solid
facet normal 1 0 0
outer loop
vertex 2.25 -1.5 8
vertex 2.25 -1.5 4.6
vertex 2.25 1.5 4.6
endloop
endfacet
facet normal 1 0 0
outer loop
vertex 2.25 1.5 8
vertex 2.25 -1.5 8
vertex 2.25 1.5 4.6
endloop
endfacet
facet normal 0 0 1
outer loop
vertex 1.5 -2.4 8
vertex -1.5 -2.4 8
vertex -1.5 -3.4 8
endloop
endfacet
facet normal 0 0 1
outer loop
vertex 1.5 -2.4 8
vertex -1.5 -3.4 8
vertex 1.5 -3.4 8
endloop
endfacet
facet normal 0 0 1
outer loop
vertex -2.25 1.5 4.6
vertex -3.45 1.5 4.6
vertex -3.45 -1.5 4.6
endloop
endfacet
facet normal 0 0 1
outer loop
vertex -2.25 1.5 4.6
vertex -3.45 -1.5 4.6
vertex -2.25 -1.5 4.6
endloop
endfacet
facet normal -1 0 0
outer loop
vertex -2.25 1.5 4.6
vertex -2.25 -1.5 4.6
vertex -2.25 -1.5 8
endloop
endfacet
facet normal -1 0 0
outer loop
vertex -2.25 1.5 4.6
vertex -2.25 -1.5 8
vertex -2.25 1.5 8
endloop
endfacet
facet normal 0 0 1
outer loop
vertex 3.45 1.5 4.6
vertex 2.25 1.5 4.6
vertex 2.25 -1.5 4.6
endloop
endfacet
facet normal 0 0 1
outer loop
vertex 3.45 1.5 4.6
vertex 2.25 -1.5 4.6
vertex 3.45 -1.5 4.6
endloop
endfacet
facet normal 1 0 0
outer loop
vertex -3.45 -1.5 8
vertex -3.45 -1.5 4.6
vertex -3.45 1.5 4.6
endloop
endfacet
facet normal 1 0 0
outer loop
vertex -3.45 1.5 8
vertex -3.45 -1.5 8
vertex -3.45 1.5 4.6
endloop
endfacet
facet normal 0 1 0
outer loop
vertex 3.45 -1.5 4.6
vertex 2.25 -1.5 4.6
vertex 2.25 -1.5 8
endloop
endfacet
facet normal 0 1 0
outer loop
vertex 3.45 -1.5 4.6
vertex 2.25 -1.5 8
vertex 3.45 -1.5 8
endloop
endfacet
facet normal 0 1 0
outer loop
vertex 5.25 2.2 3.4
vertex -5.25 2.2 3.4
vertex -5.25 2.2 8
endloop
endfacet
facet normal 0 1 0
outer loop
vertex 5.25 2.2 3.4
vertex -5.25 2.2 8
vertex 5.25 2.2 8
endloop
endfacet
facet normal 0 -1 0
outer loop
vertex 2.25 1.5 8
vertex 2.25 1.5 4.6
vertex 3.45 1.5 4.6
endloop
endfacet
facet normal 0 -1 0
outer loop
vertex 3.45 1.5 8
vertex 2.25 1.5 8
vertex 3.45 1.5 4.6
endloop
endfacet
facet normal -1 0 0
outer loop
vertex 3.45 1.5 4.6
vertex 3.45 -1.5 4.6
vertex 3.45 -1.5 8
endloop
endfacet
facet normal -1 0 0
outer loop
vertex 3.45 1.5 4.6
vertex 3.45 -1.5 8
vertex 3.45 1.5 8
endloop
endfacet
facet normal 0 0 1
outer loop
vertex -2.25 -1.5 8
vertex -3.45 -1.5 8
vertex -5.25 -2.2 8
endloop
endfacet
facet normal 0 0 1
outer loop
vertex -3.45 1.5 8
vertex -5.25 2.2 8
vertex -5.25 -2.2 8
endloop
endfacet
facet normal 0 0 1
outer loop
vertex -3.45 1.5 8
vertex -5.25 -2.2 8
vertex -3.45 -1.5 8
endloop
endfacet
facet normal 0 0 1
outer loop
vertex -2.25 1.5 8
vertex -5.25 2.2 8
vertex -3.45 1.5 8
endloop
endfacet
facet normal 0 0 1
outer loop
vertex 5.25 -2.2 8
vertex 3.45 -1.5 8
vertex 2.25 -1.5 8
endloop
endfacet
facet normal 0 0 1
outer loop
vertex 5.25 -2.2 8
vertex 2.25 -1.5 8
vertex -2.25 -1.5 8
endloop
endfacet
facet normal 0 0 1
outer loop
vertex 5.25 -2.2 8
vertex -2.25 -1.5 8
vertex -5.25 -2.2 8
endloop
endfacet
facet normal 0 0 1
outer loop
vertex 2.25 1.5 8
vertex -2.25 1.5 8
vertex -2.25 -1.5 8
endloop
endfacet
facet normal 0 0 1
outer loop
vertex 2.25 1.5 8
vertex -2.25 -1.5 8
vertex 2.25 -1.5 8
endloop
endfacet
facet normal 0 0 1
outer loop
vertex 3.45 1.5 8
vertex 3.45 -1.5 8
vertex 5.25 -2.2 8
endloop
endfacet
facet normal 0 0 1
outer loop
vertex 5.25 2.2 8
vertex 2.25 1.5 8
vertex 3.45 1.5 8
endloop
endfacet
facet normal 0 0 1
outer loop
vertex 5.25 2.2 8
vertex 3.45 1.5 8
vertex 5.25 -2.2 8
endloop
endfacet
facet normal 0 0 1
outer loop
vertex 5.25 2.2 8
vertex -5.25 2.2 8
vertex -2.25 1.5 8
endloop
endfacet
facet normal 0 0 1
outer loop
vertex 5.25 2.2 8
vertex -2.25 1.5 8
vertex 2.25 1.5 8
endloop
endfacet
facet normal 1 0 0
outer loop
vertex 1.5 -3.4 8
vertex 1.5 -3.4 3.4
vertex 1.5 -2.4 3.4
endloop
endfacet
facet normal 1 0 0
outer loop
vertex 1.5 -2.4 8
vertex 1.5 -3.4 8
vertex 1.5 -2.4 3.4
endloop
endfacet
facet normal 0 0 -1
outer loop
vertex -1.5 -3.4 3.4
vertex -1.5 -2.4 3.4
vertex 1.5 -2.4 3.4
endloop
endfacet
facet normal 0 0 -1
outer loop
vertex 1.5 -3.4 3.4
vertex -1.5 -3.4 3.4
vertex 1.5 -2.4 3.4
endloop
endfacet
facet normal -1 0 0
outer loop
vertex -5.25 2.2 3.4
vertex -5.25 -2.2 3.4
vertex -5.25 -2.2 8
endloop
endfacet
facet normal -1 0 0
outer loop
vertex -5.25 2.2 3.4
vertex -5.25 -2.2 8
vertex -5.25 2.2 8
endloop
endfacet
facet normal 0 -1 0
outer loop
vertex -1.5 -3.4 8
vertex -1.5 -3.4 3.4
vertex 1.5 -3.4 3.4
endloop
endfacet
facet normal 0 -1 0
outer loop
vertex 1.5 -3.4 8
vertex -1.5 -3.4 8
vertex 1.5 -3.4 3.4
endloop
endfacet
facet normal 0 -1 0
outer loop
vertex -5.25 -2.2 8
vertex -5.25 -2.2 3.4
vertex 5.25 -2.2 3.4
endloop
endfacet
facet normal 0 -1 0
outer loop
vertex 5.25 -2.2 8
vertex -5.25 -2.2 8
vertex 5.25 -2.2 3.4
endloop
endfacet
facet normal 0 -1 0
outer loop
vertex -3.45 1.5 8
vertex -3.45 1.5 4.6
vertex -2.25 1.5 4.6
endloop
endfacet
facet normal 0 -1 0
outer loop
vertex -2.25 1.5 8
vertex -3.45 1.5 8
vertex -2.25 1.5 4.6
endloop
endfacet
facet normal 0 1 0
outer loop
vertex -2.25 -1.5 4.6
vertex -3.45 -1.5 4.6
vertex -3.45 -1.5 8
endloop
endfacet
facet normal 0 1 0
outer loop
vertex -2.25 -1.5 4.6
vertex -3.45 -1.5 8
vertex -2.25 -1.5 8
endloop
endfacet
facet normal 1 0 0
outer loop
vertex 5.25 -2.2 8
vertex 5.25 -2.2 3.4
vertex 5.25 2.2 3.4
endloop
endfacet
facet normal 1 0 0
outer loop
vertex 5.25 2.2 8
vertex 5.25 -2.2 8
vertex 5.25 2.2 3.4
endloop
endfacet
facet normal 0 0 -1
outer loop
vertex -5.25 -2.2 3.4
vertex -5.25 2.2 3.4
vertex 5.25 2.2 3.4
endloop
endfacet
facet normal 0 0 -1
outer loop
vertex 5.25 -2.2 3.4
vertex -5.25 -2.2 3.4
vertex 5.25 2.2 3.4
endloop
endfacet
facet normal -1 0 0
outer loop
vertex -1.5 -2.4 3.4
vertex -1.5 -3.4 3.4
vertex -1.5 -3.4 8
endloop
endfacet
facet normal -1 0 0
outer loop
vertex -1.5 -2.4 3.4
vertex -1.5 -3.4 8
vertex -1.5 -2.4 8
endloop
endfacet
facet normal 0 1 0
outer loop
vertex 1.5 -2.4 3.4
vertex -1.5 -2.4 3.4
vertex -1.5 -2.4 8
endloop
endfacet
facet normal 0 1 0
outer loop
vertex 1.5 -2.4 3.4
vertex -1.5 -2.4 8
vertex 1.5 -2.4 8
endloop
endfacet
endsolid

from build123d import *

# Parameters (mm, degrees)
BOX006_W     = 1.2
BOX006_H     = 3
BOX006_DEPTH = 3.4
BOX007_W     = 1.2
BOX007_H     = 3
BOX007_DEPTH = 3.4
BOX004_W     = 10.5
BOX004_H     = 4.4
BOX004_DEPTH = 4.6
BOX005_W     = 3
BOX005_H     = 1
BOX005_DEPTH = 4.6


with BuildPart() as pg1350_hole1:
    # Box006 → Box006 (new body)
    with BuildSketch(Plane(origin=(-3.45, -1.5, 4.6), x_dir=(1, 0, 0), z_dir=(0, 0, 1))):
        with Locations((0.6, 1.5)):
            Rectangle(BOX006_W, BOX006_H)
    extrude(amount=BOX006_DEPTH)


with BuildPart() as pg1350_holes:
    # Box007 → Box007 (new body)
    with BuildSketch(Plane(origin=(2.25, -1.5, 4.6), x_dir=(1, 0, 0), z_dir=(0, 0, 1))):
        with Locations((0.6, 1.5)):
            Rectangle(BOX007_W, BOX007_H)
    extrude(amount=BOX007_DEPTH)

    # Fusion001: union PG1350_Hole1
    add(pg1350_hole1.part)


with BuildPart() as pg1350_stemmain:
    # Box004 → Box004 (new body)
    with BuildSketch(Plane(origin=(-5.25, -2.2, 3.4), x_dir=(1, 0, 0), z_dir=(0, 0, 1))):
        with Locations((5.25, 2.2)):
            Rectangle(BOX004_W, BOX004_H)
    extrude(amount=BOX004_DEPTH)


with BuildPart() as pg1350_stem:
    # Box005 → Box005 (new body)
    with BuildSketch(Plane(origin=(-1.5, -3.4, 3.4), x_dir=(1, 0, 0), z_dir=(0, 0, 1))):
        with Locations((1.5, 0.5)):
            Rectangle(BOX005_W, BOX005_H)
    extrude(amount=BOX005_DEPTH)

    # Fusion: union PG1350_StemMain
    add(pg1350_stemmain.part)

    # Cut001: cut PG1350_Holes
    add(pg1350_holes.part, mode=Mode.SUBTRACT)


solid = pg1350_stem.part
